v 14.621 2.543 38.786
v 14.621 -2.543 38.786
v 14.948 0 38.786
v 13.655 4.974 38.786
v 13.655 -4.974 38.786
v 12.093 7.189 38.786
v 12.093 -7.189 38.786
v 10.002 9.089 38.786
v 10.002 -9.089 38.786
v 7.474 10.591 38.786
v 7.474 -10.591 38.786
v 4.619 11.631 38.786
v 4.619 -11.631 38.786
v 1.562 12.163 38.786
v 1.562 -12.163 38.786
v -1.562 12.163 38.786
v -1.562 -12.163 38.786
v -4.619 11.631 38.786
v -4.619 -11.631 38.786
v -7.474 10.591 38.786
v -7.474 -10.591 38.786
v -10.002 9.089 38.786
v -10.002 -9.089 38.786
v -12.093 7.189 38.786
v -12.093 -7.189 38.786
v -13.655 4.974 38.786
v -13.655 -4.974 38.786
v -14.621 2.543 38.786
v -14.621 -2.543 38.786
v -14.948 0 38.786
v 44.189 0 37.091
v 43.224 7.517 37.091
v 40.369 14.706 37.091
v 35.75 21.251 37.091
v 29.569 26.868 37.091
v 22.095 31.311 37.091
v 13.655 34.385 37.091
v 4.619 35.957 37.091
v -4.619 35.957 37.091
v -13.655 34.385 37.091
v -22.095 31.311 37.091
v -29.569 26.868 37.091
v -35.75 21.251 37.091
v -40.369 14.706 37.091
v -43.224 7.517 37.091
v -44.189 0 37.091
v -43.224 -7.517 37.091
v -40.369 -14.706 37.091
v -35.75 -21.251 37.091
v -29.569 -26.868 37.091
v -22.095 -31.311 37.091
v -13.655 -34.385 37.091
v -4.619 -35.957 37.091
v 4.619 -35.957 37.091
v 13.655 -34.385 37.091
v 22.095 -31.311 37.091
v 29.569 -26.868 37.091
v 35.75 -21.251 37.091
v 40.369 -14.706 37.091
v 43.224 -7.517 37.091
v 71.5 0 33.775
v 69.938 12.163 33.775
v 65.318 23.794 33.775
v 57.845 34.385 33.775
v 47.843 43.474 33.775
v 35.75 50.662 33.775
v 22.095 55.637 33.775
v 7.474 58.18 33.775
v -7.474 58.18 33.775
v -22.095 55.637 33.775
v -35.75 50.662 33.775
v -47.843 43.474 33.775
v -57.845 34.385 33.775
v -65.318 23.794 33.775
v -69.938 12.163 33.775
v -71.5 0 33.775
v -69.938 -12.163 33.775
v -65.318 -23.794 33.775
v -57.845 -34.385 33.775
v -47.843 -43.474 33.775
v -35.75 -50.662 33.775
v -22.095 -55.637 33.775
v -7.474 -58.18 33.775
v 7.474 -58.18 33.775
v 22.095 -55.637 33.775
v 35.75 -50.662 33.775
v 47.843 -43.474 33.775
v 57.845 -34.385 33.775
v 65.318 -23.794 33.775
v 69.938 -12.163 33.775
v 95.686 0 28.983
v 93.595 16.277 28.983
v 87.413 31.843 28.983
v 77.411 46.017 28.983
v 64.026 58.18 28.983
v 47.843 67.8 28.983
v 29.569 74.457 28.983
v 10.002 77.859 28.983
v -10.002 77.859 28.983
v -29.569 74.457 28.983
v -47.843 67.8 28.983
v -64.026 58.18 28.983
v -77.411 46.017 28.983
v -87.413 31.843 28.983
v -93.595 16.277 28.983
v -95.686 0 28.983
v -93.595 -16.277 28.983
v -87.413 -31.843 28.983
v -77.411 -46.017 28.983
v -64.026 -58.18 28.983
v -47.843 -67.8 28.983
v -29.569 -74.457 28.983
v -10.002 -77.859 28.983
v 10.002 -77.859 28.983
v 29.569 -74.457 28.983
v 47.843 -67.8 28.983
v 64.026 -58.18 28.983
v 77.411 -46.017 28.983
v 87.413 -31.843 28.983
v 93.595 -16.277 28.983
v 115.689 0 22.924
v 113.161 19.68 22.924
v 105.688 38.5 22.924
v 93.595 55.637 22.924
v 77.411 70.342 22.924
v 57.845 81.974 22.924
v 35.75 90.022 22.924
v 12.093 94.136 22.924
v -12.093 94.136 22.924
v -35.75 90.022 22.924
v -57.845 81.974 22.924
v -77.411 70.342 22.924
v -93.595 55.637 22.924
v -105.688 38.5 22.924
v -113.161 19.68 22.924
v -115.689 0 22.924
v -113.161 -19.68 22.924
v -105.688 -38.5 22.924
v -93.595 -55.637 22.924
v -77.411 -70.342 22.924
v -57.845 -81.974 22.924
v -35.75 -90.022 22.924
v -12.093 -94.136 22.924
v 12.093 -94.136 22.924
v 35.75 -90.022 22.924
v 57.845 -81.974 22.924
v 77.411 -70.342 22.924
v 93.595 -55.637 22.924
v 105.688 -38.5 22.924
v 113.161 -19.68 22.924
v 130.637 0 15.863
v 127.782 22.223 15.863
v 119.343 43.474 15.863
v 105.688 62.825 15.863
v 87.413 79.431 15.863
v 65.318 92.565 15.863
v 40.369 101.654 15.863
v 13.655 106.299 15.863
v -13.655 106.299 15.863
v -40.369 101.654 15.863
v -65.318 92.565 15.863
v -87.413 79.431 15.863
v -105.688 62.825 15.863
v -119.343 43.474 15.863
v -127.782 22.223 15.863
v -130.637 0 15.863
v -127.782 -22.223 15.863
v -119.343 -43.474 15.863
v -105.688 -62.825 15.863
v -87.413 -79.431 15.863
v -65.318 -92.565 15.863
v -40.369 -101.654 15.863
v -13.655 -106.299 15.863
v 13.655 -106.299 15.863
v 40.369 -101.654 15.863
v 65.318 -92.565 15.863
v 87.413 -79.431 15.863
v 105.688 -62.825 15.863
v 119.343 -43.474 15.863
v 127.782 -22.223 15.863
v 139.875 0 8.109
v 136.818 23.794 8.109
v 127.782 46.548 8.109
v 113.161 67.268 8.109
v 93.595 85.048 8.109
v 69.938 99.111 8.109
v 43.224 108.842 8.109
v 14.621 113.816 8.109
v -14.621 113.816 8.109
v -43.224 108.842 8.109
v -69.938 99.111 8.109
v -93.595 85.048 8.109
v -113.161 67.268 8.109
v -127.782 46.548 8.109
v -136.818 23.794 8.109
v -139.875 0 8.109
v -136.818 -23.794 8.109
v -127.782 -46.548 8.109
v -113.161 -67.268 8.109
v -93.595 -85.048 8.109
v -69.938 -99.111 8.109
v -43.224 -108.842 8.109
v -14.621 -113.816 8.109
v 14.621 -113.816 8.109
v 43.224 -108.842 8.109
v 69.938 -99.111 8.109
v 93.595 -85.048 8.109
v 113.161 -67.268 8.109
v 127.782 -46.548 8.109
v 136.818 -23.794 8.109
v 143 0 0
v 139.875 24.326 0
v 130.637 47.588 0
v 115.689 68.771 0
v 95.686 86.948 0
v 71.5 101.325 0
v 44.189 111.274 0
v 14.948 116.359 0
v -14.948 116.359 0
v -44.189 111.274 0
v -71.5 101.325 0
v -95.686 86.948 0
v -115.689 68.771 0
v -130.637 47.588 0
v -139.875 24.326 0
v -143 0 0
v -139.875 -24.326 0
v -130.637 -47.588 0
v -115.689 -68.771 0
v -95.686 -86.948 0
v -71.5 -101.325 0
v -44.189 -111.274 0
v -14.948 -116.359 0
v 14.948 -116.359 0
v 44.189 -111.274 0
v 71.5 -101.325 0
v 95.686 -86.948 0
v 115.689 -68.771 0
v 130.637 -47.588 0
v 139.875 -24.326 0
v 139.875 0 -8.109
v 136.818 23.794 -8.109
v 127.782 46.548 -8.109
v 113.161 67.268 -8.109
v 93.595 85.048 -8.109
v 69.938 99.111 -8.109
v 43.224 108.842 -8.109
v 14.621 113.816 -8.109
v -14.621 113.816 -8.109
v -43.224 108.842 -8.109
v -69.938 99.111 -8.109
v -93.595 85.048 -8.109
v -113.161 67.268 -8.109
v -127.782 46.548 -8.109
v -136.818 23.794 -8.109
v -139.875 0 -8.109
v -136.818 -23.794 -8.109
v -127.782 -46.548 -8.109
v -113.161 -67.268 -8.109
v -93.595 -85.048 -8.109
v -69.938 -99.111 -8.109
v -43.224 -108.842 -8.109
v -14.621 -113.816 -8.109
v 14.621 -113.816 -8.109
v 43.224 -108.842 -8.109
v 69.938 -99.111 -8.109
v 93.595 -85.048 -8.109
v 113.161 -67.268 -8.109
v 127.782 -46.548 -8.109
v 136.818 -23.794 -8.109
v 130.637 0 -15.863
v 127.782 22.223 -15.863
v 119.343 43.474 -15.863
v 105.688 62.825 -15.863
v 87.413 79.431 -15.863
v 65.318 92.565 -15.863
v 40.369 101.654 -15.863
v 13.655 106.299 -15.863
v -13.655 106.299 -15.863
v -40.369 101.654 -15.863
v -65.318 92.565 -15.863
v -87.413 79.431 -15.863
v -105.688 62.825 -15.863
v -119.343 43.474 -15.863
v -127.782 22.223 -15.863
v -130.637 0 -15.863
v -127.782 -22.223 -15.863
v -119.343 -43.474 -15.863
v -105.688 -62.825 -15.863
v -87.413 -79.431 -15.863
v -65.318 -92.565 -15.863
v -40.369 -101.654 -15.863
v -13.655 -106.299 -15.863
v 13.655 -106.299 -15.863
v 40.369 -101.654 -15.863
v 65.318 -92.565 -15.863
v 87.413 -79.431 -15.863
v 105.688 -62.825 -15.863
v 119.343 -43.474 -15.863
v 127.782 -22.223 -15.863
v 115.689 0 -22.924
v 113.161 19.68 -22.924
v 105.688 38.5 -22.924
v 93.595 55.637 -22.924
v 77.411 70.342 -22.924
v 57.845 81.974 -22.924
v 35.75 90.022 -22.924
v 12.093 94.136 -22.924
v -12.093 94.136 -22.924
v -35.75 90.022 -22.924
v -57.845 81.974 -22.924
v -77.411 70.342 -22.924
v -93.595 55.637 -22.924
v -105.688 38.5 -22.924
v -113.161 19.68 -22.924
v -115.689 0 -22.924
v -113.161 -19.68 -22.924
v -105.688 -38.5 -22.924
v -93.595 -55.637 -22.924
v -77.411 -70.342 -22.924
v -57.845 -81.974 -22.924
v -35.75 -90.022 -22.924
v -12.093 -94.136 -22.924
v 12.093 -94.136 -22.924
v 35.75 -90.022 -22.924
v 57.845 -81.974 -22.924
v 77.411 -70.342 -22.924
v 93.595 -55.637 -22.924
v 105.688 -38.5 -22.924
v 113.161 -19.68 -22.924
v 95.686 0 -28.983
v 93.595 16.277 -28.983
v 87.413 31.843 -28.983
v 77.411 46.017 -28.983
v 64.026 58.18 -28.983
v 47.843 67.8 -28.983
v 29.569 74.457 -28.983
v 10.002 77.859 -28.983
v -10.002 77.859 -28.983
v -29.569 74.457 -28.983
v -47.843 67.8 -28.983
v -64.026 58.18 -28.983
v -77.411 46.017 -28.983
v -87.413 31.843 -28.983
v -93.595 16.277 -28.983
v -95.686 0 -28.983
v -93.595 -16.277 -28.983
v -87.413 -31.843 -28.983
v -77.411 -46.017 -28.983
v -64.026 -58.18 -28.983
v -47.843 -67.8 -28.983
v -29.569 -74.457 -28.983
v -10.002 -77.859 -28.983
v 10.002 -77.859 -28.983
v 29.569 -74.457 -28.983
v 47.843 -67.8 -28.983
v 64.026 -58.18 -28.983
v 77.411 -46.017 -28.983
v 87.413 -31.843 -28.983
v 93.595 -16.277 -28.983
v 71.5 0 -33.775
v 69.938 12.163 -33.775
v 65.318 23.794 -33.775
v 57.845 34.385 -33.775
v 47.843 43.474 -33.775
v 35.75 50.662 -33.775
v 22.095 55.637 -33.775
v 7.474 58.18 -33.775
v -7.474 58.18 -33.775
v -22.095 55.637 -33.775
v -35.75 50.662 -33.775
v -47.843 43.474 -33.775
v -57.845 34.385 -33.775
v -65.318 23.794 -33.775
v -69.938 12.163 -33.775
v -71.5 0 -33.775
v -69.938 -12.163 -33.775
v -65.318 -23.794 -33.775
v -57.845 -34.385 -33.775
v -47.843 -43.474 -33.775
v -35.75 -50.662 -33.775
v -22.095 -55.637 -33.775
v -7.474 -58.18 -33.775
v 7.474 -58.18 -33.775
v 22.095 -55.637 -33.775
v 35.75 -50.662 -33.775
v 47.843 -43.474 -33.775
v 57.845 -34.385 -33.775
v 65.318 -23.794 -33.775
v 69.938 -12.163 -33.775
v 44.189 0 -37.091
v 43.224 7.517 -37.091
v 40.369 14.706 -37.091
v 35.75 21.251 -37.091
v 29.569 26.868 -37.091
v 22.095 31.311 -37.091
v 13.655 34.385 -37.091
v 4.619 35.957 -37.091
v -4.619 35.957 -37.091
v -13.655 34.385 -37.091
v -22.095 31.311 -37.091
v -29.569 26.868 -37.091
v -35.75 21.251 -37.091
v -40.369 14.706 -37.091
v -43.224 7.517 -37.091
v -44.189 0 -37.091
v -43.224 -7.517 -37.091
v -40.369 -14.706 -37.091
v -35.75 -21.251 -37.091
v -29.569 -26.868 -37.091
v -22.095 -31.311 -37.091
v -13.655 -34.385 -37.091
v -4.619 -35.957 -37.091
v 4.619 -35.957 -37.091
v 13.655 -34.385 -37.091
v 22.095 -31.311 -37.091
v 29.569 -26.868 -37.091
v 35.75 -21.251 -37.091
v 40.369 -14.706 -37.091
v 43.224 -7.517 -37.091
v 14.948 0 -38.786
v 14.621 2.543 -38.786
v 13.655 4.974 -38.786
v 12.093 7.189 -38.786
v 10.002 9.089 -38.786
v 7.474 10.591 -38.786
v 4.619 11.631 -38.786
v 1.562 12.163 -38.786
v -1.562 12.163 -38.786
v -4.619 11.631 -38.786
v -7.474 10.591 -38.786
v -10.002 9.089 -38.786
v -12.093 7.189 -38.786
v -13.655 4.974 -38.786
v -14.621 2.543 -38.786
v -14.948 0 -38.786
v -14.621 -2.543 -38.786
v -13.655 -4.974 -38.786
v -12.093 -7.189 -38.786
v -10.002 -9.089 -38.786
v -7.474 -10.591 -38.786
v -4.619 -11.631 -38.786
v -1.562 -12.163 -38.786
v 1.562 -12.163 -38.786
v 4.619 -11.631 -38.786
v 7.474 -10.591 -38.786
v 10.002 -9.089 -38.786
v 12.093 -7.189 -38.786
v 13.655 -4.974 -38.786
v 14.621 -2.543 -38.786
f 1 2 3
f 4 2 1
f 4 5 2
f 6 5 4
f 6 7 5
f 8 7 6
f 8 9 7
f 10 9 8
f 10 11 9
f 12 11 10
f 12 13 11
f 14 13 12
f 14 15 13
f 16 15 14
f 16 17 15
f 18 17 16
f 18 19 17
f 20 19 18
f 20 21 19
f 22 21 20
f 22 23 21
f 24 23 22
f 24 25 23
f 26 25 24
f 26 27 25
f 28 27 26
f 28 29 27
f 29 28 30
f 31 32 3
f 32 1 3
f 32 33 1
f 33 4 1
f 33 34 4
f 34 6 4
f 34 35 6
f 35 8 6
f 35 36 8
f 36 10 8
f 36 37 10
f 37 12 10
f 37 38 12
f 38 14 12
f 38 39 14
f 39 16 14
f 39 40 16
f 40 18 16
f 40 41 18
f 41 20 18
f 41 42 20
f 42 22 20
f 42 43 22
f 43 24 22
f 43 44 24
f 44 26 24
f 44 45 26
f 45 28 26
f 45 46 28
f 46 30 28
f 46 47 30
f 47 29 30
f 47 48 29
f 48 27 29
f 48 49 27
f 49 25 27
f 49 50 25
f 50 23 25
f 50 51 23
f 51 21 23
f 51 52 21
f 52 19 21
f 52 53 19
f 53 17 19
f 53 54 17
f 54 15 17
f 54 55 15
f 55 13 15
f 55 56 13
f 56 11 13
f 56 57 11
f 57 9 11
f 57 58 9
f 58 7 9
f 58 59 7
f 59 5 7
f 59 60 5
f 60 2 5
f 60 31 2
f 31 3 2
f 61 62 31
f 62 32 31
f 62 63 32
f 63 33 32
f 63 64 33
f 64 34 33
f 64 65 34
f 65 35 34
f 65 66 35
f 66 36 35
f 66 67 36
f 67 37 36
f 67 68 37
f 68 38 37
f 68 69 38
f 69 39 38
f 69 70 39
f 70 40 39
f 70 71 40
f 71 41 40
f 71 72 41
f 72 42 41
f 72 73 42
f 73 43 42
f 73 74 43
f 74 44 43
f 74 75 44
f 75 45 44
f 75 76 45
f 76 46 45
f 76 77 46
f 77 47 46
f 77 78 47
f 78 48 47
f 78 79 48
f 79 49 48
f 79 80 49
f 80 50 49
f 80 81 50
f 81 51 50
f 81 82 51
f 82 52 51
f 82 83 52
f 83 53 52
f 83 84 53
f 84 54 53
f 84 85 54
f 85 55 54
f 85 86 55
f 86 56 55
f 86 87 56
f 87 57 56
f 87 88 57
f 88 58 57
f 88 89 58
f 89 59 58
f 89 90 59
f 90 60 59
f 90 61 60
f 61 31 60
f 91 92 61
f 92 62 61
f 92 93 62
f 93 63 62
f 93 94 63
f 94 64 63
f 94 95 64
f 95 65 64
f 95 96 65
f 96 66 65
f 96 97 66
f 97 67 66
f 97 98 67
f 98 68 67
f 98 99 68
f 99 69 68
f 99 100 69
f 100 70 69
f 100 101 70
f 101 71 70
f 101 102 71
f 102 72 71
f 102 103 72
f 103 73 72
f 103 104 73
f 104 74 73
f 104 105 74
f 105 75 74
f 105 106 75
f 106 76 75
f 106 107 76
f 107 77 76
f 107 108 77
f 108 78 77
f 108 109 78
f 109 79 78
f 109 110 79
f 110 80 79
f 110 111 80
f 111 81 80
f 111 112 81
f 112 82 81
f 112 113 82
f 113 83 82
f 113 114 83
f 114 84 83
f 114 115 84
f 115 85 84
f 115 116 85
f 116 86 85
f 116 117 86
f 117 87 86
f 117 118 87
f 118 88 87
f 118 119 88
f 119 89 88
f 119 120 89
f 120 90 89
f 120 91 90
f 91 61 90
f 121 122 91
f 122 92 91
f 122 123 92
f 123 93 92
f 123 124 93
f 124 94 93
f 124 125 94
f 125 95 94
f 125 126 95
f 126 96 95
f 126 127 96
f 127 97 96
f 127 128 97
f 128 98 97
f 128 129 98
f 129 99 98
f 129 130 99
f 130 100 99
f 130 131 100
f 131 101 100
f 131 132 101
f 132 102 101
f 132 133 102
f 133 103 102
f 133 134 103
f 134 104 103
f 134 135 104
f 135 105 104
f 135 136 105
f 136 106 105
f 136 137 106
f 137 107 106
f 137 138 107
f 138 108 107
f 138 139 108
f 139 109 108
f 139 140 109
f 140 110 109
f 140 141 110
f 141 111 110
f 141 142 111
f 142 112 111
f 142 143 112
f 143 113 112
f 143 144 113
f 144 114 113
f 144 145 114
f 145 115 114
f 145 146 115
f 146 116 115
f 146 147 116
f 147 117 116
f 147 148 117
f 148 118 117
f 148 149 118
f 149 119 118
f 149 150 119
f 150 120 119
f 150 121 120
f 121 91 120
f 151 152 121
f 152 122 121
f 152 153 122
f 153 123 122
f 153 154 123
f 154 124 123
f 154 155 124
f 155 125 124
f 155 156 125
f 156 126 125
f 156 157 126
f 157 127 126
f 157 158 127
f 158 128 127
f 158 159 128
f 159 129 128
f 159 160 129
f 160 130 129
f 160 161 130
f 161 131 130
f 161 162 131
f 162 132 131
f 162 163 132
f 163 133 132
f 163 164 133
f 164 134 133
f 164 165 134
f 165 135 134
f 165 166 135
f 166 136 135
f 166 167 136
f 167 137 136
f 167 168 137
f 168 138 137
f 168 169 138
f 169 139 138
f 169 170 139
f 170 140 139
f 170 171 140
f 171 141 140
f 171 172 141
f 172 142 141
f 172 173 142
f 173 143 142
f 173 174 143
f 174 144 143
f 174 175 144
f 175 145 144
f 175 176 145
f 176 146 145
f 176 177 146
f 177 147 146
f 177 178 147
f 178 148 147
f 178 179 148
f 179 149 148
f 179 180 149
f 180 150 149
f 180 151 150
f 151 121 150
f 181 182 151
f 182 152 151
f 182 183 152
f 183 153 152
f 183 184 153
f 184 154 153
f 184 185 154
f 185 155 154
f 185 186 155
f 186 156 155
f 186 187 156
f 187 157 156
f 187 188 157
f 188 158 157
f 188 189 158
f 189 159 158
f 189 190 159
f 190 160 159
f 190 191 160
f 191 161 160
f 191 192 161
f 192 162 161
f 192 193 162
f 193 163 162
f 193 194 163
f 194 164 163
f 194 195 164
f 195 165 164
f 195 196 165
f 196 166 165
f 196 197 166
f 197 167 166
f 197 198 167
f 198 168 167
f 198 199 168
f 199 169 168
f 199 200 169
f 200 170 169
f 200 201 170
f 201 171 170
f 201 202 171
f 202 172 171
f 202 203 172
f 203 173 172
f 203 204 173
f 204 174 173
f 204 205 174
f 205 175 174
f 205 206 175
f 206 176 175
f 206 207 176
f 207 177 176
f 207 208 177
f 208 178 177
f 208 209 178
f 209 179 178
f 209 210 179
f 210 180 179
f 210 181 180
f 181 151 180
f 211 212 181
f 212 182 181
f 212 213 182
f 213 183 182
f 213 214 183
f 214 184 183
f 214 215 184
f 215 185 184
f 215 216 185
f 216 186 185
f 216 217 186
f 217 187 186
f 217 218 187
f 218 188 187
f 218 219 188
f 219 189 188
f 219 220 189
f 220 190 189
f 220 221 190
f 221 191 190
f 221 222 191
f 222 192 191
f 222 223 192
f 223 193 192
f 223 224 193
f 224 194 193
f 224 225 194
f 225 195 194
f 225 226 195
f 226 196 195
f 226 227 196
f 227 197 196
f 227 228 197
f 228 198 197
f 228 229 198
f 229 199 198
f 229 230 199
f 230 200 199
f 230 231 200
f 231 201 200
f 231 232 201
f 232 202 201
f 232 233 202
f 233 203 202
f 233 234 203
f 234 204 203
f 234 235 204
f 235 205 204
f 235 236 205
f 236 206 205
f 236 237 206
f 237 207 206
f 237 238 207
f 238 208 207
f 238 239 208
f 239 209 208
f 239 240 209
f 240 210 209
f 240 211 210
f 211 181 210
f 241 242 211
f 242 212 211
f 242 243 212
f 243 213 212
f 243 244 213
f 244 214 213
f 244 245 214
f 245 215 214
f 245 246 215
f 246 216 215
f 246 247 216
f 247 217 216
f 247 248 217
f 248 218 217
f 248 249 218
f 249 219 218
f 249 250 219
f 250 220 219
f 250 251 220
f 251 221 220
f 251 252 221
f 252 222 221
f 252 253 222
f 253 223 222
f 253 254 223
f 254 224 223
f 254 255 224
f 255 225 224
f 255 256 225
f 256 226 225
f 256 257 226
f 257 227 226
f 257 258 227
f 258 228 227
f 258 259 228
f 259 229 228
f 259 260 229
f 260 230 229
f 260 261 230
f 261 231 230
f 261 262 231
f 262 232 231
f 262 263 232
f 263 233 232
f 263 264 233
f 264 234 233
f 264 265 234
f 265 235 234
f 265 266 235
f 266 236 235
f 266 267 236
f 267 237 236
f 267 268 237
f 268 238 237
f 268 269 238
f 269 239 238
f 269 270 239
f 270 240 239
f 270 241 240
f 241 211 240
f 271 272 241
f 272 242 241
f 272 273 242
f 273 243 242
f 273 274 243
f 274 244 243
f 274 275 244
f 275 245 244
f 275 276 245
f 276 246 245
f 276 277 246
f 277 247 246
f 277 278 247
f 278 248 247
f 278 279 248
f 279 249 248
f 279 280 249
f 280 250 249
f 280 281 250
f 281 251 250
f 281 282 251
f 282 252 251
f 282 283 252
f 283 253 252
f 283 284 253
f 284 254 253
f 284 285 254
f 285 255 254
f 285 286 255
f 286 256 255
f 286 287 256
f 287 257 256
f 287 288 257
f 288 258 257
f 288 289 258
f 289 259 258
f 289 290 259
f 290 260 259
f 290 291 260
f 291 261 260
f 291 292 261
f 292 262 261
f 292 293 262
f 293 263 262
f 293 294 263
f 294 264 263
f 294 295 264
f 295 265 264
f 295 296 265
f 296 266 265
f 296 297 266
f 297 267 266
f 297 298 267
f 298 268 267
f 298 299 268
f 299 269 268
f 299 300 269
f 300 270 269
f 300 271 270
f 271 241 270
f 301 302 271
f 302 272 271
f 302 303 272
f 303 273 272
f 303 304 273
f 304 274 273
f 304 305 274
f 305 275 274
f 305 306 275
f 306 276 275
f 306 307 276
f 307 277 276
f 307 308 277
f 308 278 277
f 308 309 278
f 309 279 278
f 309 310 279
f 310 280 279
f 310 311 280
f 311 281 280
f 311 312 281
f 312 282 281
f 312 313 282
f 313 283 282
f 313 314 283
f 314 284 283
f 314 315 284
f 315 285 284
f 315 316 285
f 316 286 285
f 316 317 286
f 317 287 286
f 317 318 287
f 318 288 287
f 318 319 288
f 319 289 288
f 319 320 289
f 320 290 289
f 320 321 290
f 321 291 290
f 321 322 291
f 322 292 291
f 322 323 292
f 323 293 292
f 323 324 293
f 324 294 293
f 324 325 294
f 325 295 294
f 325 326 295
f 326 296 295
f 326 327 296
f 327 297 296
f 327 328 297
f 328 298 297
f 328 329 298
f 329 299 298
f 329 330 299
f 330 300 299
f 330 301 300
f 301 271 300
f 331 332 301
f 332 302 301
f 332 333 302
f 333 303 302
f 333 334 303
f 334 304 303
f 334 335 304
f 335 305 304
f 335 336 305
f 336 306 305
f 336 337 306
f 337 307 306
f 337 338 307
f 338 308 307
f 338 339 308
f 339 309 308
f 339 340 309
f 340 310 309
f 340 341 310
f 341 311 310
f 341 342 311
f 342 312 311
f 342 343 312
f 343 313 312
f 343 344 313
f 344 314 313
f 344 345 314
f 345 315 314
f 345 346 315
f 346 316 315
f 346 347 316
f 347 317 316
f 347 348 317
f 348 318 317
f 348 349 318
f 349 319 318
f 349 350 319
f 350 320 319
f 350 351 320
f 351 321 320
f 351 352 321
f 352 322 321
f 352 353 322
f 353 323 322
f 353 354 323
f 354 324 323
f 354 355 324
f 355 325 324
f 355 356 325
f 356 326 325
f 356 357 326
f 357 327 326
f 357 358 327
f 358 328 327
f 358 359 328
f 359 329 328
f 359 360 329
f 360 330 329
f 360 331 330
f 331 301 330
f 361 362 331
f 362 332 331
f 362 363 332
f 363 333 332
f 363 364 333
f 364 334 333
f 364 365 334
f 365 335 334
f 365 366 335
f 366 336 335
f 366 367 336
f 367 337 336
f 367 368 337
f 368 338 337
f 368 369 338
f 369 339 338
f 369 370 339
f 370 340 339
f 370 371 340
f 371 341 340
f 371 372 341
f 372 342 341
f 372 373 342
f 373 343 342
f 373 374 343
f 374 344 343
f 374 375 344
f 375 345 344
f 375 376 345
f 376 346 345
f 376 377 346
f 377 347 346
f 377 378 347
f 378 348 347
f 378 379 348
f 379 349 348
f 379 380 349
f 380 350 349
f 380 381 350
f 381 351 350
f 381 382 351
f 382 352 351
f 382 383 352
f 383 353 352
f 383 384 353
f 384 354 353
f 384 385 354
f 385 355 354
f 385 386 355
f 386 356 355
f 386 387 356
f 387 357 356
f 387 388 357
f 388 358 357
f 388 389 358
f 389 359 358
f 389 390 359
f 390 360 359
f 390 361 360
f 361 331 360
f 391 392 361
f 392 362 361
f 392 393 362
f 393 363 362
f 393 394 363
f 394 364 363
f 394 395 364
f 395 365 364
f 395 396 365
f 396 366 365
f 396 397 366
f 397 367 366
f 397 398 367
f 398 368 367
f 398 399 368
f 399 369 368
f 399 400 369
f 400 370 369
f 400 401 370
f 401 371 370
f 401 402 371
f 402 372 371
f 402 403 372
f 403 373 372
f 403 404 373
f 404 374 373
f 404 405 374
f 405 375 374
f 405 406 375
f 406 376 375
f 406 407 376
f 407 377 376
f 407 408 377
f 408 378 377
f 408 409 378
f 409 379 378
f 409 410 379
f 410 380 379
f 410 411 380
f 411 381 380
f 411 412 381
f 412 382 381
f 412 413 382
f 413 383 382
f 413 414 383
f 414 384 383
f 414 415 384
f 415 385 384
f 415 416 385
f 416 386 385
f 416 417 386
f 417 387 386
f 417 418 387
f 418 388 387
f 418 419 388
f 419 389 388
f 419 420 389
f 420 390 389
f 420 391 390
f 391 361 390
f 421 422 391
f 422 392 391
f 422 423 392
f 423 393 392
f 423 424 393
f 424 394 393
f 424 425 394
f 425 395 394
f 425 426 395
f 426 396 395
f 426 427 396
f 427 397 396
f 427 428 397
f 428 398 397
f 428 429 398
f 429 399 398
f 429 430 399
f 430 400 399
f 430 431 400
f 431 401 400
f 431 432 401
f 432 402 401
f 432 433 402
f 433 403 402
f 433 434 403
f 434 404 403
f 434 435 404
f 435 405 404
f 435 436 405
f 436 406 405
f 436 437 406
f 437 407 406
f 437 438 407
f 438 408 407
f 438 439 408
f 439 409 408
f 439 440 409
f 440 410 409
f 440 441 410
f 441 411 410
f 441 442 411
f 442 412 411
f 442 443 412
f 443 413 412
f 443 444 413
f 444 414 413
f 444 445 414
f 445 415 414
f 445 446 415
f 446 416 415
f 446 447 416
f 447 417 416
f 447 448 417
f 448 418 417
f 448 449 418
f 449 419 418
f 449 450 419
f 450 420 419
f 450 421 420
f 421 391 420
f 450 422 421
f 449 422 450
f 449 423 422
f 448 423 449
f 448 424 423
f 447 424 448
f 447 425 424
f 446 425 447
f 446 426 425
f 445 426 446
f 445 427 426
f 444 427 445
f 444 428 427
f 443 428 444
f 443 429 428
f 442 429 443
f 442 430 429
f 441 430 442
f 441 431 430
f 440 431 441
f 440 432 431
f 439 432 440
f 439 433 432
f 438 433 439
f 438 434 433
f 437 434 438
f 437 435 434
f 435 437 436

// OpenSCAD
// Generated by SolidPython 1.0.1 on 2020-07-29 00:46:49


scale(v = [11, 9, 3]) {
	sphere(r = 13);
}
/***********************************************
*********      SolidPython code:      **********
************************************************
 
# import packages: SolidPython
from solid import *
from solid.utils import *
from itertools import chain, combinations, permutations


class Resize:

    def __init__(self, scad_file):
        self.scad_file = scad_file
        #self.scad_file = import_scad(scad_file)
        # cone/cylinder param:
        self.r1 = 0
        self.r2 = 0
        self.h = 0
        # rectangular prism param:
        self.w = 0
        self.l = 0
        # ellipse param:
        self.r = 0

    # import OpenScad code (file name corresponds to shape)


    # classify shape + parameters
    def assign(self, param1, param2, param3):
        if self.scad_file == 'cone.scad':
            self.r1 = param1
            self.r2 = param2
            self.h = param3
        elif self.scad_file == 'cylinder.scad':
            self.r1 = param1
            self.r2 = param2
            self.h = param3
        elif self.scad_file == 'rectangularPrism.scad':
            self.h = param1
            self.l = param2
            self.w = param3
        else:
            self.r = param1
            self.h = param2

    # resize parameters
    def iterate(self):
        x = range(3, 20, 2)
        i = 1
        if self.scad_file == 'cone.scad':
            tempList = list(permutations(x, 2))
            for temp in tempList:
                param1 = temp[0]
                param2 = temp[1]
                filepath = 'produced_scad_files/' + 'cone' + str(param1) + '_' + str(param2) + '_' + '.scad'
                scad_render_to_file(cylinder(h=param1, r1=param2, r2=0), filepath)

        elif self.scad_file == 'cylinder.scad':
            tempList = list(permutations(x, 3))
            for temp in tempList:
                param1 = temp[0]
                param2 = temp[1]
                filepath = 'produced_scad_files/' + 'cylinder' + str(param1) + '_' + str(param2) + '_' + '.scad'
                scad_render_to_file(cylinder(h=param1, r1=param2, r2=param2), filepath)

        elif self.scad_file == 'rectangularPrism.scad':
            tempList = list(permutations(x, 3))
            for temp in tempList:
                param1 = temp[0]
                param2 = temp[1]
                param3 = temp[2]
                filepath = 'produced_scad_files/' + 'rectangularPrism' + str(param1) + '_' + str(param2) + '_' + str(
                    param3) + '.scad'
                scad_render_to_file(cube(size=(param1, param2, param3)), filepath)

        elif self.scad_file == 'ellipse.scad':
            tempList = list(permutations(x, 4))
            for temp in tempList:
                param1 = temp[0]
                param2 = temp[1]
                param3 = temp[2]
                param4 = temp[3]
                filepath = 'produced_scad_files/' + 'ellipse' + str(param1) + '_' + str(param2) + '_' + str(param3) + '_' + str(param4) + '.scad'
                scad_render_to_file(scale([param1, param2, param3])(sphere(r=param4)), filepath)

    def render_to_scadfile(self):
        scad_render_to_file(scad, 'example.scad') 
 
************************************************/
